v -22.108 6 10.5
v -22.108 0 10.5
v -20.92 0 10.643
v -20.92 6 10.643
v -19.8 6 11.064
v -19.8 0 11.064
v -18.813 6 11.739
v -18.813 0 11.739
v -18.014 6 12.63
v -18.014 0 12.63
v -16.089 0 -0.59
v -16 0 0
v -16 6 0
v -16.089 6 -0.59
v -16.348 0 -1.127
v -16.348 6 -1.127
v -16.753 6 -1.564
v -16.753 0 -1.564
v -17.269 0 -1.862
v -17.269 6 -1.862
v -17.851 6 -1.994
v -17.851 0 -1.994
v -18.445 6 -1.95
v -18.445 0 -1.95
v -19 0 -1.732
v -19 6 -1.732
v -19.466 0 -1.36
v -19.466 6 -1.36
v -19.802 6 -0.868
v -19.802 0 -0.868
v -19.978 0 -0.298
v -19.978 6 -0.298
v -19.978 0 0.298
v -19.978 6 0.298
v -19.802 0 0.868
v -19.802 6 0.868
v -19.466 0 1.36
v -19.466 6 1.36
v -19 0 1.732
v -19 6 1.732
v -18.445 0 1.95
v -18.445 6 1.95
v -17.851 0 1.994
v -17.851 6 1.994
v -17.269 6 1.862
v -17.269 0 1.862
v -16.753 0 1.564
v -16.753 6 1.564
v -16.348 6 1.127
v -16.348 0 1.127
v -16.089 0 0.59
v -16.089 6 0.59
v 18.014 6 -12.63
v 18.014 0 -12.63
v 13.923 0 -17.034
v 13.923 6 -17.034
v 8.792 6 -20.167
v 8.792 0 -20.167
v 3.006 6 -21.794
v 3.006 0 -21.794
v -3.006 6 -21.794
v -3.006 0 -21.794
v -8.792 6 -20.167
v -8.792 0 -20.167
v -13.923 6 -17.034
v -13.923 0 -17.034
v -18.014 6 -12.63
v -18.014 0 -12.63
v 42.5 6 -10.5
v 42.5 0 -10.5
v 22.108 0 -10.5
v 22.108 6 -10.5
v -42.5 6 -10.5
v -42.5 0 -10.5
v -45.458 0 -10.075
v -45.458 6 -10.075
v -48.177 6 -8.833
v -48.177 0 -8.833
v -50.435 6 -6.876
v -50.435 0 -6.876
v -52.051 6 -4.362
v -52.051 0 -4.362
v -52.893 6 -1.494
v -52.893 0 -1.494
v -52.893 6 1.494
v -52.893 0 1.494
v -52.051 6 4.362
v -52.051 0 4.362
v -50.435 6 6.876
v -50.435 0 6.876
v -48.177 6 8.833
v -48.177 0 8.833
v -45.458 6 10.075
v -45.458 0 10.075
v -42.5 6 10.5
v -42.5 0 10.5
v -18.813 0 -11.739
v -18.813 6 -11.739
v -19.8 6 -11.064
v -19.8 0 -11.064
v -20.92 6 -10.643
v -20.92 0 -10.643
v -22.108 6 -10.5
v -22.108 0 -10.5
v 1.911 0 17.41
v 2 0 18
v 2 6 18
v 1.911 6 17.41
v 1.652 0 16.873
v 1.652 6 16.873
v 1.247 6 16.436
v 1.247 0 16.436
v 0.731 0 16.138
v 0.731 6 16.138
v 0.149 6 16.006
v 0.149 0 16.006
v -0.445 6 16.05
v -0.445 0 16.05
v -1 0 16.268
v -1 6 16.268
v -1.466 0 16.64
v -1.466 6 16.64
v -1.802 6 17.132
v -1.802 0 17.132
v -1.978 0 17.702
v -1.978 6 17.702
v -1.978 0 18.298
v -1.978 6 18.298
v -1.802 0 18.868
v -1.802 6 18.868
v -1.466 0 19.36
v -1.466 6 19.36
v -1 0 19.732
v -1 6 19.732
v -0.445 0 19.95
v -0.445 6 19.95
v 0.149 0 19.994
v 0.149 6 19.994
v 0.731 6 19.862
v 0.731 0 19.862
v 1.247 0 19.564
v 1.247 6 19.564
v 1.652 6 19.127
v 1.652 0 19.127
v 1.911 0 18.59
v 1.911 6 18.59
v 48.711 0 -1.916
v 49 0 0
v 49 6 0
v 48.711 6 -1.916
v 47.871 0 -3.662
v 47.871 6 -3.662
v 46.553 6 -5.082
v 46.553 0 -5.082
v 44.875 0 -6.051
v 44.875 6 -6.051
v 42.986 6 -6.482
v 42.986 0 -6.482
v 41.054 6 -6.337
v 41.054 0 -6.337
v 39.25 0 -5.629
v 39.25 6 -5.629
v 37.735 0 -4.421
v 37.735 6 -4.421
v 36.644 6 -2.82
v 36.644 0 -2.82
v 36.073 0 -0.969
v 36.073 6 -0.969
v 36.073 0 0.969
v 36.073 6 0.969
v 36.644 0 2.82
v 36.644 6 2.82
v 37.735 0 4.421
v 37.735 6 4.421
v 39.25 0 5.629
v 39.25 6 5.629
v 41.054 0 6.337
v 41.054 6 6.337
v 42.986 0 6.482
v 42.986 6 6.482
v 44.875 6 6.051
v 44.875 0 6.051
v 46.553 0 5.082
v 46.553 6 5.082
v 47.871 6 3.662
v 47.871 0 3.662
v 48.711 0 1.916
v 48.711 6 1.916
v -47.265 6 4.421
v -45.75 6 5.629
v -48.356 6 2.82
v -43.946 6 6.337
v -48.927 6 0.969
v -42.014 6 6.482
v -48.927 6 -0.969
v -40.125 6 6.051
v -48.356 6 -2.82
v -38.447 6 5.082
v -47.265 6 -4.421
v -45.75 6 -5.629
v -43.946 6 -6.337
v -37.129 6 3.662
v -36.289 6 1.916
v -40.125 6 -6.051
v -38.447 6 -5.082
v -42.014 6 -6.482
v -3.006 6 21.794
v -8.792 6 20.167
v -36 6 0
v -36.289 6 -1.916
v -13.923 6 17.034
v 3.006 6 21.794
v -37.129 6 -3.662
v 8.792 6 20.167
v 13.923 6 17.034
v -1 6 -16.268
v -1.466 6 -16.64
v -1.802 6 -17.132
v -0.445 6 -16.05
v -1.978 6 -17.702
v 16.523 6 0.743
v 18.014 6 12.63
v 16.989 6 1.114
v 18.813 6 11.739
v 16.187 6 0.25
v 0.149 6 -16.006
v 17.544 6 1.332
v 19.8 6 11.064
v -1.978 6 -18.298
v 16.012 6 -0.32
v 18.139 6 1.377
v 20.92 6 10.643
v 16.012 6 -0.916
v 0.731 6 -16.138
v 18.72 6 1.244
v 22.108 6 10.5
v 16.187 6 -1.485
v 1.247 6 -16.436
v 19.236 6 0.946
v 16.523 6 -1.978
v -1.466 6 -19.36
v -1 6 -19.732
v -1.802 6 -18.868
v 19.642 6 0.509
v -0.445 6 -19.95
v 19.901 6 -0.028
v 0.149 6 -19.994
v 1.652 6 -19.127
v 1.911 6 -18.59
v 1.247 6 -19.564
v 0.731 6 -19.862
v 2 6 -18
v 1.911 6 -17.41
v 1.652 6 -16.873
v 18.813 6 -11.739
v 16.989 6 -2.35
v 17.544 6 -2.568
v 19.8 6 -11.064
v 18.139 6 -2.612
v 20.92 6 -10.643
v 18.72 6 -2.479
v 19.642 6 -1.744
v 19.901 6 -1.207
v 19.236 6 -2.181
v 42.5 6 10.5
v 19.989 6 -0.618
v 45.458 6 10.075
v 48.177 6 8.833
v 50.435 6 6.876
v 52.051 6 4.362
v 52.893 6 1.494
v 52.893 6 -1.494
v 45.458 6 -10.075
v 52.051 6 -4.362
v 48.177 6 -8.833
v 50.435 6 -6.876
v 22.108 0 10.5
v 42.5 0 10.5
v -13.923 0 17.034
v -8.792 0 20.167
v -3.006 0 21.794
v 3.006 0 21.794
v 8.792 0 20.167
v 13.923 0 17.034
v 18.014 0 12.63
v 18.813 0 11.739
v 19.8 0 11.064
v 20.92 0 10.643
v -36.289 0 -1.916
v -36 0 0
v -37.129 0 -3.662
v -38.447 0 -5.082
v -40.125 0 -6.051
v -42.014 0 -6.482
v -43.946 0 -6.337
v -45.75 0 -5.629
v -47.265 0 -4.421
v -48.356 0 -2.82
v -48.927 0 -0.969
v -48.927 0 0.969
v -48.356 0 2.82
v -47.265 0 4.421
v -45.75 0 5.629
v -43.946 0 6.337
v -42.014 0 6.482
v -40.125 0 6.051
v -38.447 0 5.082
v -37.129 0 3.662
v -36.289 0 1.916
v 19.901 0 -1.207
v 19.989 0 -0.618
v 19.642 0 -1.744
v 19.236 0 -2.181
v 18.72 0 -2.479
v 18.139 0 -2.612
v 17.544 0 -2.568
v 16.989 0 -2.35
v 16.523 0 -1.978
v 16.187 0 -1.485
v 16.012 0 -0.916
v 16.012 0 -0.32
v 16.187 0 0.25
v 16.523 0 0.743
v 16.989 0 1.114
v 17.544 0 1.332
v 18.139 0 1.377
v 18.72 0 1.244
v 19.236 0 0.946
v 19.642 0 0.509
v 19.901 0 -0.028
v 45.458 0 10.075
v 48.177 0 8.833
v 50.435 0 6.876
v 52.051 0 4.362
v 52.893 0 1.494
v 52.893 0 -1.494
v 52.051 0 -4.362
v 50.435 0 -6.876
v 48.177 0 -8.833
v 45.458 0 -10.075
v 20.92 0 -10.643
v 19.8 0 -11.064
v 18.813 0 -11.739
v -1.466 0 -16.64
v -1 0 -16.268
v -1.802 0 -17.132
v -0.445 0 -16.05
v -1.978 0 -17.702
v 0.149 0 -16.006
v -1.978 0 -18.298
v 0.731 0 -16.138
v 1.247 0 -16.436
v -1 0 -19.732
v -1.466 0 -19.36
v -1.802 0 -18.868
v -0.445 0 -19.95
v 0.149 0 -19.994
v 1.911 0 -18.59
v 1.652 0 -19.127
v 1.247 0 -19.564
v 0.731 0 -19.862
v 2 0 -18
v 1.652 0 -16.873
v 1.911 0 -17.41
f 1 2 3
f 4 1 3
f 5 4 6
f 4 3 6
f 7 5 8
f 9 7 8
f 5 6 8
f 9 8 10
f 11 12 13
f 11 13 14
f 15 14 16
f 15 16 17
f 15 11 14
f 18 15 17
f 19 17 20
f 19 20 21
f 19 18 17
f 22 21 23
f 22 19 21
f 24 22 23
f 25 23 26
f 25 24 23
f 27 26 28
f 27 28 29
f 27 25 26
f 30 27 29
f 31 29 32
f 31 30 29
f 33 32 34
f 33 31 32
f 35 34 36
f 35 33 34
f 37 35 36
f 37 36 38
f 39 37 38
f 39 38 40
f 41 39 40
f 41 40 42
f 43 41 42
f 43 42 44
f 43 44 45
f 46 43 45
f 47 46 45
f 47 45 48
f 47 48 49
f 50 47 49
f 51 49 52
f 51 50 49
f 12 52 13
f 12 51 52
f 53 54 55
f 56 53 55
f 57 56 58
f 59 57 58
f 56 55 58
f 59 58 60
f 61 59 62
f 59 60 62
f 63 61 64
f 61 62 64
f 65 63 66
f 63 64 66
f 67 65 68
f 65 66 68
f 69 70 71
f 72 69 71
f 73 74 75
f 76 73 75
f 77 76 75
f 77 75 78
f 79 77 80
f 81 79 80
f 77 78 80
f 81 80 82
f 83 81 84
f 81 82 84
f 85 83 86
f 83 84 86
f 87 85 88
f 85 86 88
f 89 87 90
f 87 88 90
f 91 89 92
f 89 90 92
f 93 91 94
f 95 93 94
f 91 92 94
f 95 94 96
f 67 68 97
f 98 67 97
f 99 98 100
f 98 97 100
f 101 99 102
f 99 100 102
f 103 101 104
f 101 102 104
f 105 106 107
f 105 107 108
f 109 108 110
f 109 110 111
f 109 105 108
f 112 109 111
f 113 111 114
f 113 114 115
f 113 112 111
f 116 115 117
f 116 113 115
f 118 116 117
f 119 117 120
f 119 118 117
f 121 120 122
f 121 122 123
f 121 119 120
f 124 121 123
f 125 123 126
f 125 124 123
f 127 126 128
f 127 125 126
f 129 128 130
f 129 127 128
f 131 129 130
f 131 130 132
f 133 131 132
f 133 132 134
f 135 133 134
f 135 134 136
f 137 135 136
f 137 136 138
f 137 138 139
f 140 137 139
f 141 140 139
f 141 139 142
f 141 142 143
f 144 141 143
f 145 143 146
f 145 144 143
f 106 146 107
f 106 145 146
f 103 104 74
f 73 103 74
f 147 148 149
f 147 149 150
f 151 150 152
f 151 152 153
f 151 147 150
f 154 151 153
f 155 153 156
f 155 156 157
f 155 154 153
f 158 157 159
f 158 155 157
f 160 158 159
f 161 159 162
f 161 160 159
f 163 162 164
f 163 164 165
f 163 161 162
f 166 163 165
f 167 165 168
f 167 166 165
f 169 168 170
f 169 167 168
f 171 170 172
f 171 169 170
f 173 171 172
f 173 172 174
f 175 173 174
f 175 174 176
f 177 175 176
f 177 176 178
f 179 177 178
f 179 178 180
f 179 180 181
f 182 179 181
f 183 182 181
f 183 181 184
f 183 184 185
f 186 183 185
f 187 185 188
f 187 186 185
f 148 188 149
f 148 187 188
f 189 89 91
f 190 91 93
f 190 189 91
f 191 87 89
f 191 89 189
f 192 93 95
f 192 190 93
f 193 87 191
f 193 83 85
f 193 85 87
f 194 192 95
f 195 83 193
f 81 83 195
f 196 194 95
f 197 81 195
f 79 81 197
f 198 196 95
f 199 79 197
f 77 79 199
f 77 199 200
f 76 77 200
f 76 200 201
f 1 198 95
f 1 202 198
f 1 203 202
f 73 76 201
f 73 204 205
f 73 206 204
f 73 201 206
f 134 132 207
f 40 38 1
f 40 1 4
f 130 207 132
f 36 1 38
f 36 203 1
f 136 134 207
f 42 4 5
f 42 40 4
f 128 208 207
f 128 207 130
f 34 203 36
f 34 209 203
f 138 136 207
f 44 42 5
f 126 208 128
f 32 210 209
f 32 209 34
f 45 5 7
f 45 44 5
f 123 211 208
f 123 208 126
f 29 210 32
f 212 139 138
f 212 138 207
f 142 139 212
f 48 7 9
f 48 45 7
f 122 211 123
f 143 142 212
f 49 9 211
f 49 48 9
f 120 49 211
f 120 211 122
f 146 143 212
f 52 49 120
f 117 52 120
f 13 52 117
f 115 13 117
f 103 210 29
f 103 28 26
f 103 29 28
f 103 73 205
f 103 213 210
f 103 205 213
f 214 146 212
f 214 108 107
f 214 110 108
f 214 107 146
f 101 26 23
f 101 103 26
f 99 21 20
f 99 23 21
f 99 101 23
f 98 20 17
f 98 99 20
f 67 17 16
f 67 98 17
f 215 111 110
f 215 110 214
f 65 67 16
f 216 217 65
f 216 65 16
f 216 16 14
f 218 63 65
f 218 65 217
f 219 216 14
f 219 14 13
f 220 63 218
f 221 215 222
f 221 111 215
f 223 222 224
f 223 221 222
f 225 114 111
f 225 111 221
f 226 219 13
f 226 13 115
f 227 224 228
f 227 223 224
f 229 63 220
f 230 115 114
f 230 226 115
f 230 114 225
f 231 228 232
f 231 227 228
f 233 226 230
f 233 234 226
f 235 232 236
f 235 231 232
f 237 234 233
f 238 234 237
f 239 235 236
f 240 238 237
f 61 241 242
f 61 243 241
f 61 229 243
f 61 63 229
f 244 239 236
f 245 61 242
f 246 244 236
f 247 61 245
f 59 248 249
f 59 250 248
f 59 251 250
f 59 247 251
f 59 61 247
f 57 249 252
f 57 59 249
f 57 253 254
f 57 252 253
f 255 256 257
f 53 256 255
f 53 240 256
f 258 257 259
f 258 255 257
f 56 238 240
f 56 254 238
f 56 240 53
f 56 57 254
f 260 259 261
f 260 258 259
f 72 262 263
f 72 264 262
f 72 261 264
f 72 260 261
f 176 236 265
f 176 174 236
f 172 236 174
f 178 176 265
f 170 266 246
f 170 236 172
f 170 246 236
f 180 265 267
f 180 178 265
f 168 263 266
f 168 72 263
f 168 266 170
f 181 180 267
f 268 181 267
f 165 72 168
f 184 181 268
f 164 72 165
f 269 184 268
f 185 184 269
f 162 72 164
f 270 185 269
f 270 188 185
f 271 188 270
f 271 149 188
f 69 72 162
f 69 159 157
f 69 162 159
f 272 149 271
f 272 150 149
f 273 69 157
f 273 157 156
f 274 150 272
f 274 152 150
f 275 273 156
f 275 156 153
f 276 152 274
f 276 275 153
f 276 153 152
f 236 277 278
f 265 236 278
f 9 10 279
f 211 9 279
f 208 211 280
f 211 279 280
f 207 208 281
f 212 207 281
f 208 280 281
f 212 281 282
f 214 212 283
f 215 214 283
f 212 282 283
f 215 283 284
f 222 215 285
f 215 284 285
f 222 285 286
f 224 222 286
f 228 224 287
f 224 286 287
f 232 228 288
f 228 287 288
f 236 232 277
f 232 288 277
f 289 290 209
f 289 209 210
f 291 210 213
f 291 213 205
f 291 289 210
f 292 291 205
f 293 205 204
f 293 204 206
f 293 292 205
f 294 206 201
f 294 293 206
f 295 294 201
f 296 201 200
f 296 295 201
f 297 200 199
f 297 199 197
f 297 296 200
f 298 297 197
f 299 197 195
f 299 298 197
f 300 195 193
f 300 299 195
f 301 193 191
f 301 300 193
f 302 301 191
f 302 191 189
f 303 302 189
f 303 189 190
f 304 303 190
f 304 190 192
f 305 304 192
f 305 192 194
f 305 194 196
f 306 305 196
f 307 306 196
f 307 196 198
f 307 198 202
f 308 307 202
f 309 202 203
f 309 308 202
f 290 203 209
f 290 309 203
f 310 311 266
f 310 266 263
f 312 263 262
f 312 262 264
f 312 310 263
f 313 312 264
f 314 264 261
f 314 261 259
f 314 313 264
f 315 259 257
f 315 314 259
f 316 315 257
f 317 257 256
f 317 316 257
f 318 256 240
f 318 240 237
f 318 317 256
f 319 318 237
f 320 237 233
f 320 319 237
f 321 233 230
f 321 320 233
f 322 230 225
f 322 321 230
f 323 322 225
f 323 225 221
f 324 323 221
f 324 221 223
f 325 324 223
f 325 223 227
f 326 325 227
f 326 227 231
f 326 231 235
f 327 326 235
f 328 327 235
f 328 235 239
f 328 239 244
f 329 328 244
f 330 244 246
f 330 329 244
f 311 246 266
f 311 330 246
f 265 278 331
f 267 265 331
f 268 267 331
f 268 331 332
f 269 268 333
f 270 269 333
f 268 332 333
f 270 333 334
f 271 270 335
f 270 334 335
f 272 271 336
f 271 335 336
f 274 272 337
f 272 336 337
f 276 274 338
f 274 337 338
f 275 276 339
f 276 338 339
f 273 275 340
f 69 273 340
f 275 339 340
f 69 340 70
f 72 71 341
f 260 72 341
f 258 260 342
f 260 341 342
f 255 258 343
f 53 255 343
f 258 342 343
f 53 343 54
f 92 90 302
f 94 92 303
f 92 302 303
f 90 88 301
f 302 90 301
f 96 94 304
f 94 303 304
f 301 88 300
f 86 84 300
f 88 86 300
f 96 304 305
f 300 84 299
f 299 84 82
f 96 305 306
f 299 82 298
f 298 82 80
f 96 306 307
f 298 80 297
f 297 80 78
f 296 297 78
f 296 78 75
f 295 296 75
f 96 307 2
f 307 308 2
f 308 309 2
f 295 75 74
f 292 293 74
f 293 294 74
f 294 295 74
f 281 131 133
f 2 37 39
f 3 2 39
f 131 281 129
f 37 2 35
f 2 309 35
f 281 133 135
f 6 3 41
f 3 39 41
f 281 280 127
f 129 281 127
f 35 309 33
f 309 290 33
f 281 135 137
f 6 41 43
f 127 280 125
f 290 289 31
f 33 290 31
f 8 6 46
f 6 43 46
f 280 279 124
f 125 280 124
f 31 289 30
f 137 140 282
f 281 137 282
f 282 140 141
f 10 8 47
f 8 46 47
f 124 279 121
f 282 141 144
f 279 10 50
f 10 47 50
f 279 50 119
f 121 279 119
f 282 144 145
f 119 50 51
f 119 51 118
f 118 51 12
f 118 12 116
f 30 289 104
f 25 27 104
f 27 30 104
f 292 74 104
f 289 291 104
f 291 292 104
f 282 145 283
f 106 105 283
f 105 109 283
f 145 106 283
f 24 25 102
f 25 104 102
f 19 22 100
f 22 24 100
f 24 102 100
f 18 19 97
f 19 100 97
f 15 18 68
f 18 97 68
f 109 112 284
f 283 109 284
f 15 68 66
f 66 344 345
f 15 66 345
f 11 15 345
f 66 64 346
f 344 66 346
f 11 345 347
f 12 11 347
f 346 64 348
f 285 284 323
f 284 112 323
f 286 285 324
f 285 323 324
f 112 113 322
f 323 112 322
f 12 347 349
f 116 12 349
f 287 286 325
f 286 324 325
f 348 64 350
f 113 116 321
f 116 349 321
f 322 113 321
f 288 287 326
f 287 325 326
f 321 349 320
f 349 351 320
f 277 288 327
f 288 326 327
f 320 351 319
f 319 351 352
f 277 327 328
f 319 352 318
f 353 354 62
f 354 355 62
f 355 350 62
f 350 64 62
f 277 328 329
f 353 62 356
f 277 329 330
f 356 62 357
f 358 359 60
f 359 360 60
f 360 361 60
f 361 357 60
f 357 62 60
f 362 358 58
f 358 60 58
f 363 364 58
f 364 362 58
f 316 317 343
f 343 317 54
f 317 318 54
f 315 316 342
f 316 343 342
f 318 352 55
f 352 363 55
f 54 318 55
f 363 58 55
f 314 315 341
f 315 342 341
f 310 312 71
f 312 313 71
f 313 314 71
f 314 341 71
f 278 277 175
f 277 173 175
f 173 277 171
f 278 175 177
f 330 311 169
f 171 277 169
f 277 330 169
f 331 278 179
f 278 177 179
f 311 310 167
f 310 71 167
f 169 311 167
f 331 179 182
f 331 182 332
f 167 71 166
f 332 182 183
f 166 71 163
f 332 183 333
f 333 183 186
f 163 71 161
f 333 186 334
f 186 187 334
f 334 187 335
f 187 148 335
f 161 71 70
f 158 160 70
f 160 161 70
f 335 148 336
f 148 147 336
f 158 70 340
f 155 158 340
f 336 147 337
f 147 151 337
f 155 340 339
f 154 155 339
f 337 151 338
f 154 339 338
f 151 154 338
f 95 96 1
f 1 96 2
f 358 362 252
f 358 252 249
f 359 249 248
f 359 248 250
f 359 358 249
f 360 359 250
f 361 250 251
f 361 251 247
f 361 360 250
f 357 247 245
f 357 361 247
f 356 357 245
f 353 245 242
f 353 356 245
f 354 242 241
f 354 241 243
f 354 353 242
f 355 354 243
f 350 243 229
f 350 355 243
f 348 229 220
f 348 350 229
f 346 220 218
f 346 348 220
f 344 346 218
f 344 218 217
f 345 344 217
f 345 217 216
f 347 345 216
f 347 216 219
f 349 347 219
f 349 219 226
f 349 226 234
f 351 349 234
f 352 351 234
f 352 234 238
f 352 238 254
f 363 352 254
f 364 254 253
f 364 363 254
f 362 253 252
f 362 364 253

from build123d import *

# Parameters (mm, degrees)
SKETCH1_R           = 2
SKETCH1_R_2         = 6.5
BOSS_EXTRUDE1_DEPTH = 6


with BuildPart() as part:
    # Sketch1 → Boss-Extrude1 (new body)
    with BuildSketch(Plane(origin=(0, 0, 0), x_dir=(1, 0, 0), z_dir=(0, 1, 0))):
        with BuildLine():
            Line((-22.107690969, 10.5), (-42.5, 10.5))
            ThreePointArc((-42.5, 10.5), (-53, 0), (-42.5, -10.5))
            Line((-42.5, -10.5), (-22.107690969, -10.5))
            ThreePointArc((-22.107690969, -10.5), (-19.800295422, -11.06424462), (-18.013674085, -12.629629684))
            ThreePointArc((-18.013674085, -12.629629684), (7.2e-08, -22), (18.013674168, -12.629629566))
            ThreePointArc((18.013674168, -12.629629566), (19.800295486, -11.064244587), (22.107690969, -10.5))
            Line((22.107690969, -10.5), (42.5, -10.5))
            ThreePointArc((42.5, -10.5), (53, 0), (42.5, 10.5))
            Line((42.5, 10.5), (22.107690919, 10.5))
            ThreePointArc((22.107690919, 10.5), (19.800295464, 11.064244598), (18.013674168, 12.629629566))
            ThreePointArc((18.013674168, 12.629629566), (0, 22), (-18.013674168, 12.629629566))
            ThreePointArc((-18.013674168, 12.629629566), (-19.800295486, 11.064244587), (-22.107690969, 10.5))
        make_face()
        with Locations((17.989399487, 0.617661785)):
            Circle(SKETCH1_R, mode=Mode.SUBTRACT)
        with Locations((-42.5, 0)):
            Circle(SKETCH1_R_2, mode=Mode.SUBTRACT)
        with Locations((-18, 0)):
            Circle(SKETCH1_R, mode=Mode.SUBTRACT)
        with Locations((0, -18)):
            Circle(SKETCH1_R, mode=Mode.SUBTRACT)
        with Locations((0, 18)):
            Circle(SKETCH1_R, mode=Mode.SUBTRACT)
        with Locations((42.5, 0)):
            Circle(SKETCH1_R_2, mode=Mode.SUBTRACT)
    extrude(amount=BOSS_EXTRUDE1_DEPTH)


solid = part.part
